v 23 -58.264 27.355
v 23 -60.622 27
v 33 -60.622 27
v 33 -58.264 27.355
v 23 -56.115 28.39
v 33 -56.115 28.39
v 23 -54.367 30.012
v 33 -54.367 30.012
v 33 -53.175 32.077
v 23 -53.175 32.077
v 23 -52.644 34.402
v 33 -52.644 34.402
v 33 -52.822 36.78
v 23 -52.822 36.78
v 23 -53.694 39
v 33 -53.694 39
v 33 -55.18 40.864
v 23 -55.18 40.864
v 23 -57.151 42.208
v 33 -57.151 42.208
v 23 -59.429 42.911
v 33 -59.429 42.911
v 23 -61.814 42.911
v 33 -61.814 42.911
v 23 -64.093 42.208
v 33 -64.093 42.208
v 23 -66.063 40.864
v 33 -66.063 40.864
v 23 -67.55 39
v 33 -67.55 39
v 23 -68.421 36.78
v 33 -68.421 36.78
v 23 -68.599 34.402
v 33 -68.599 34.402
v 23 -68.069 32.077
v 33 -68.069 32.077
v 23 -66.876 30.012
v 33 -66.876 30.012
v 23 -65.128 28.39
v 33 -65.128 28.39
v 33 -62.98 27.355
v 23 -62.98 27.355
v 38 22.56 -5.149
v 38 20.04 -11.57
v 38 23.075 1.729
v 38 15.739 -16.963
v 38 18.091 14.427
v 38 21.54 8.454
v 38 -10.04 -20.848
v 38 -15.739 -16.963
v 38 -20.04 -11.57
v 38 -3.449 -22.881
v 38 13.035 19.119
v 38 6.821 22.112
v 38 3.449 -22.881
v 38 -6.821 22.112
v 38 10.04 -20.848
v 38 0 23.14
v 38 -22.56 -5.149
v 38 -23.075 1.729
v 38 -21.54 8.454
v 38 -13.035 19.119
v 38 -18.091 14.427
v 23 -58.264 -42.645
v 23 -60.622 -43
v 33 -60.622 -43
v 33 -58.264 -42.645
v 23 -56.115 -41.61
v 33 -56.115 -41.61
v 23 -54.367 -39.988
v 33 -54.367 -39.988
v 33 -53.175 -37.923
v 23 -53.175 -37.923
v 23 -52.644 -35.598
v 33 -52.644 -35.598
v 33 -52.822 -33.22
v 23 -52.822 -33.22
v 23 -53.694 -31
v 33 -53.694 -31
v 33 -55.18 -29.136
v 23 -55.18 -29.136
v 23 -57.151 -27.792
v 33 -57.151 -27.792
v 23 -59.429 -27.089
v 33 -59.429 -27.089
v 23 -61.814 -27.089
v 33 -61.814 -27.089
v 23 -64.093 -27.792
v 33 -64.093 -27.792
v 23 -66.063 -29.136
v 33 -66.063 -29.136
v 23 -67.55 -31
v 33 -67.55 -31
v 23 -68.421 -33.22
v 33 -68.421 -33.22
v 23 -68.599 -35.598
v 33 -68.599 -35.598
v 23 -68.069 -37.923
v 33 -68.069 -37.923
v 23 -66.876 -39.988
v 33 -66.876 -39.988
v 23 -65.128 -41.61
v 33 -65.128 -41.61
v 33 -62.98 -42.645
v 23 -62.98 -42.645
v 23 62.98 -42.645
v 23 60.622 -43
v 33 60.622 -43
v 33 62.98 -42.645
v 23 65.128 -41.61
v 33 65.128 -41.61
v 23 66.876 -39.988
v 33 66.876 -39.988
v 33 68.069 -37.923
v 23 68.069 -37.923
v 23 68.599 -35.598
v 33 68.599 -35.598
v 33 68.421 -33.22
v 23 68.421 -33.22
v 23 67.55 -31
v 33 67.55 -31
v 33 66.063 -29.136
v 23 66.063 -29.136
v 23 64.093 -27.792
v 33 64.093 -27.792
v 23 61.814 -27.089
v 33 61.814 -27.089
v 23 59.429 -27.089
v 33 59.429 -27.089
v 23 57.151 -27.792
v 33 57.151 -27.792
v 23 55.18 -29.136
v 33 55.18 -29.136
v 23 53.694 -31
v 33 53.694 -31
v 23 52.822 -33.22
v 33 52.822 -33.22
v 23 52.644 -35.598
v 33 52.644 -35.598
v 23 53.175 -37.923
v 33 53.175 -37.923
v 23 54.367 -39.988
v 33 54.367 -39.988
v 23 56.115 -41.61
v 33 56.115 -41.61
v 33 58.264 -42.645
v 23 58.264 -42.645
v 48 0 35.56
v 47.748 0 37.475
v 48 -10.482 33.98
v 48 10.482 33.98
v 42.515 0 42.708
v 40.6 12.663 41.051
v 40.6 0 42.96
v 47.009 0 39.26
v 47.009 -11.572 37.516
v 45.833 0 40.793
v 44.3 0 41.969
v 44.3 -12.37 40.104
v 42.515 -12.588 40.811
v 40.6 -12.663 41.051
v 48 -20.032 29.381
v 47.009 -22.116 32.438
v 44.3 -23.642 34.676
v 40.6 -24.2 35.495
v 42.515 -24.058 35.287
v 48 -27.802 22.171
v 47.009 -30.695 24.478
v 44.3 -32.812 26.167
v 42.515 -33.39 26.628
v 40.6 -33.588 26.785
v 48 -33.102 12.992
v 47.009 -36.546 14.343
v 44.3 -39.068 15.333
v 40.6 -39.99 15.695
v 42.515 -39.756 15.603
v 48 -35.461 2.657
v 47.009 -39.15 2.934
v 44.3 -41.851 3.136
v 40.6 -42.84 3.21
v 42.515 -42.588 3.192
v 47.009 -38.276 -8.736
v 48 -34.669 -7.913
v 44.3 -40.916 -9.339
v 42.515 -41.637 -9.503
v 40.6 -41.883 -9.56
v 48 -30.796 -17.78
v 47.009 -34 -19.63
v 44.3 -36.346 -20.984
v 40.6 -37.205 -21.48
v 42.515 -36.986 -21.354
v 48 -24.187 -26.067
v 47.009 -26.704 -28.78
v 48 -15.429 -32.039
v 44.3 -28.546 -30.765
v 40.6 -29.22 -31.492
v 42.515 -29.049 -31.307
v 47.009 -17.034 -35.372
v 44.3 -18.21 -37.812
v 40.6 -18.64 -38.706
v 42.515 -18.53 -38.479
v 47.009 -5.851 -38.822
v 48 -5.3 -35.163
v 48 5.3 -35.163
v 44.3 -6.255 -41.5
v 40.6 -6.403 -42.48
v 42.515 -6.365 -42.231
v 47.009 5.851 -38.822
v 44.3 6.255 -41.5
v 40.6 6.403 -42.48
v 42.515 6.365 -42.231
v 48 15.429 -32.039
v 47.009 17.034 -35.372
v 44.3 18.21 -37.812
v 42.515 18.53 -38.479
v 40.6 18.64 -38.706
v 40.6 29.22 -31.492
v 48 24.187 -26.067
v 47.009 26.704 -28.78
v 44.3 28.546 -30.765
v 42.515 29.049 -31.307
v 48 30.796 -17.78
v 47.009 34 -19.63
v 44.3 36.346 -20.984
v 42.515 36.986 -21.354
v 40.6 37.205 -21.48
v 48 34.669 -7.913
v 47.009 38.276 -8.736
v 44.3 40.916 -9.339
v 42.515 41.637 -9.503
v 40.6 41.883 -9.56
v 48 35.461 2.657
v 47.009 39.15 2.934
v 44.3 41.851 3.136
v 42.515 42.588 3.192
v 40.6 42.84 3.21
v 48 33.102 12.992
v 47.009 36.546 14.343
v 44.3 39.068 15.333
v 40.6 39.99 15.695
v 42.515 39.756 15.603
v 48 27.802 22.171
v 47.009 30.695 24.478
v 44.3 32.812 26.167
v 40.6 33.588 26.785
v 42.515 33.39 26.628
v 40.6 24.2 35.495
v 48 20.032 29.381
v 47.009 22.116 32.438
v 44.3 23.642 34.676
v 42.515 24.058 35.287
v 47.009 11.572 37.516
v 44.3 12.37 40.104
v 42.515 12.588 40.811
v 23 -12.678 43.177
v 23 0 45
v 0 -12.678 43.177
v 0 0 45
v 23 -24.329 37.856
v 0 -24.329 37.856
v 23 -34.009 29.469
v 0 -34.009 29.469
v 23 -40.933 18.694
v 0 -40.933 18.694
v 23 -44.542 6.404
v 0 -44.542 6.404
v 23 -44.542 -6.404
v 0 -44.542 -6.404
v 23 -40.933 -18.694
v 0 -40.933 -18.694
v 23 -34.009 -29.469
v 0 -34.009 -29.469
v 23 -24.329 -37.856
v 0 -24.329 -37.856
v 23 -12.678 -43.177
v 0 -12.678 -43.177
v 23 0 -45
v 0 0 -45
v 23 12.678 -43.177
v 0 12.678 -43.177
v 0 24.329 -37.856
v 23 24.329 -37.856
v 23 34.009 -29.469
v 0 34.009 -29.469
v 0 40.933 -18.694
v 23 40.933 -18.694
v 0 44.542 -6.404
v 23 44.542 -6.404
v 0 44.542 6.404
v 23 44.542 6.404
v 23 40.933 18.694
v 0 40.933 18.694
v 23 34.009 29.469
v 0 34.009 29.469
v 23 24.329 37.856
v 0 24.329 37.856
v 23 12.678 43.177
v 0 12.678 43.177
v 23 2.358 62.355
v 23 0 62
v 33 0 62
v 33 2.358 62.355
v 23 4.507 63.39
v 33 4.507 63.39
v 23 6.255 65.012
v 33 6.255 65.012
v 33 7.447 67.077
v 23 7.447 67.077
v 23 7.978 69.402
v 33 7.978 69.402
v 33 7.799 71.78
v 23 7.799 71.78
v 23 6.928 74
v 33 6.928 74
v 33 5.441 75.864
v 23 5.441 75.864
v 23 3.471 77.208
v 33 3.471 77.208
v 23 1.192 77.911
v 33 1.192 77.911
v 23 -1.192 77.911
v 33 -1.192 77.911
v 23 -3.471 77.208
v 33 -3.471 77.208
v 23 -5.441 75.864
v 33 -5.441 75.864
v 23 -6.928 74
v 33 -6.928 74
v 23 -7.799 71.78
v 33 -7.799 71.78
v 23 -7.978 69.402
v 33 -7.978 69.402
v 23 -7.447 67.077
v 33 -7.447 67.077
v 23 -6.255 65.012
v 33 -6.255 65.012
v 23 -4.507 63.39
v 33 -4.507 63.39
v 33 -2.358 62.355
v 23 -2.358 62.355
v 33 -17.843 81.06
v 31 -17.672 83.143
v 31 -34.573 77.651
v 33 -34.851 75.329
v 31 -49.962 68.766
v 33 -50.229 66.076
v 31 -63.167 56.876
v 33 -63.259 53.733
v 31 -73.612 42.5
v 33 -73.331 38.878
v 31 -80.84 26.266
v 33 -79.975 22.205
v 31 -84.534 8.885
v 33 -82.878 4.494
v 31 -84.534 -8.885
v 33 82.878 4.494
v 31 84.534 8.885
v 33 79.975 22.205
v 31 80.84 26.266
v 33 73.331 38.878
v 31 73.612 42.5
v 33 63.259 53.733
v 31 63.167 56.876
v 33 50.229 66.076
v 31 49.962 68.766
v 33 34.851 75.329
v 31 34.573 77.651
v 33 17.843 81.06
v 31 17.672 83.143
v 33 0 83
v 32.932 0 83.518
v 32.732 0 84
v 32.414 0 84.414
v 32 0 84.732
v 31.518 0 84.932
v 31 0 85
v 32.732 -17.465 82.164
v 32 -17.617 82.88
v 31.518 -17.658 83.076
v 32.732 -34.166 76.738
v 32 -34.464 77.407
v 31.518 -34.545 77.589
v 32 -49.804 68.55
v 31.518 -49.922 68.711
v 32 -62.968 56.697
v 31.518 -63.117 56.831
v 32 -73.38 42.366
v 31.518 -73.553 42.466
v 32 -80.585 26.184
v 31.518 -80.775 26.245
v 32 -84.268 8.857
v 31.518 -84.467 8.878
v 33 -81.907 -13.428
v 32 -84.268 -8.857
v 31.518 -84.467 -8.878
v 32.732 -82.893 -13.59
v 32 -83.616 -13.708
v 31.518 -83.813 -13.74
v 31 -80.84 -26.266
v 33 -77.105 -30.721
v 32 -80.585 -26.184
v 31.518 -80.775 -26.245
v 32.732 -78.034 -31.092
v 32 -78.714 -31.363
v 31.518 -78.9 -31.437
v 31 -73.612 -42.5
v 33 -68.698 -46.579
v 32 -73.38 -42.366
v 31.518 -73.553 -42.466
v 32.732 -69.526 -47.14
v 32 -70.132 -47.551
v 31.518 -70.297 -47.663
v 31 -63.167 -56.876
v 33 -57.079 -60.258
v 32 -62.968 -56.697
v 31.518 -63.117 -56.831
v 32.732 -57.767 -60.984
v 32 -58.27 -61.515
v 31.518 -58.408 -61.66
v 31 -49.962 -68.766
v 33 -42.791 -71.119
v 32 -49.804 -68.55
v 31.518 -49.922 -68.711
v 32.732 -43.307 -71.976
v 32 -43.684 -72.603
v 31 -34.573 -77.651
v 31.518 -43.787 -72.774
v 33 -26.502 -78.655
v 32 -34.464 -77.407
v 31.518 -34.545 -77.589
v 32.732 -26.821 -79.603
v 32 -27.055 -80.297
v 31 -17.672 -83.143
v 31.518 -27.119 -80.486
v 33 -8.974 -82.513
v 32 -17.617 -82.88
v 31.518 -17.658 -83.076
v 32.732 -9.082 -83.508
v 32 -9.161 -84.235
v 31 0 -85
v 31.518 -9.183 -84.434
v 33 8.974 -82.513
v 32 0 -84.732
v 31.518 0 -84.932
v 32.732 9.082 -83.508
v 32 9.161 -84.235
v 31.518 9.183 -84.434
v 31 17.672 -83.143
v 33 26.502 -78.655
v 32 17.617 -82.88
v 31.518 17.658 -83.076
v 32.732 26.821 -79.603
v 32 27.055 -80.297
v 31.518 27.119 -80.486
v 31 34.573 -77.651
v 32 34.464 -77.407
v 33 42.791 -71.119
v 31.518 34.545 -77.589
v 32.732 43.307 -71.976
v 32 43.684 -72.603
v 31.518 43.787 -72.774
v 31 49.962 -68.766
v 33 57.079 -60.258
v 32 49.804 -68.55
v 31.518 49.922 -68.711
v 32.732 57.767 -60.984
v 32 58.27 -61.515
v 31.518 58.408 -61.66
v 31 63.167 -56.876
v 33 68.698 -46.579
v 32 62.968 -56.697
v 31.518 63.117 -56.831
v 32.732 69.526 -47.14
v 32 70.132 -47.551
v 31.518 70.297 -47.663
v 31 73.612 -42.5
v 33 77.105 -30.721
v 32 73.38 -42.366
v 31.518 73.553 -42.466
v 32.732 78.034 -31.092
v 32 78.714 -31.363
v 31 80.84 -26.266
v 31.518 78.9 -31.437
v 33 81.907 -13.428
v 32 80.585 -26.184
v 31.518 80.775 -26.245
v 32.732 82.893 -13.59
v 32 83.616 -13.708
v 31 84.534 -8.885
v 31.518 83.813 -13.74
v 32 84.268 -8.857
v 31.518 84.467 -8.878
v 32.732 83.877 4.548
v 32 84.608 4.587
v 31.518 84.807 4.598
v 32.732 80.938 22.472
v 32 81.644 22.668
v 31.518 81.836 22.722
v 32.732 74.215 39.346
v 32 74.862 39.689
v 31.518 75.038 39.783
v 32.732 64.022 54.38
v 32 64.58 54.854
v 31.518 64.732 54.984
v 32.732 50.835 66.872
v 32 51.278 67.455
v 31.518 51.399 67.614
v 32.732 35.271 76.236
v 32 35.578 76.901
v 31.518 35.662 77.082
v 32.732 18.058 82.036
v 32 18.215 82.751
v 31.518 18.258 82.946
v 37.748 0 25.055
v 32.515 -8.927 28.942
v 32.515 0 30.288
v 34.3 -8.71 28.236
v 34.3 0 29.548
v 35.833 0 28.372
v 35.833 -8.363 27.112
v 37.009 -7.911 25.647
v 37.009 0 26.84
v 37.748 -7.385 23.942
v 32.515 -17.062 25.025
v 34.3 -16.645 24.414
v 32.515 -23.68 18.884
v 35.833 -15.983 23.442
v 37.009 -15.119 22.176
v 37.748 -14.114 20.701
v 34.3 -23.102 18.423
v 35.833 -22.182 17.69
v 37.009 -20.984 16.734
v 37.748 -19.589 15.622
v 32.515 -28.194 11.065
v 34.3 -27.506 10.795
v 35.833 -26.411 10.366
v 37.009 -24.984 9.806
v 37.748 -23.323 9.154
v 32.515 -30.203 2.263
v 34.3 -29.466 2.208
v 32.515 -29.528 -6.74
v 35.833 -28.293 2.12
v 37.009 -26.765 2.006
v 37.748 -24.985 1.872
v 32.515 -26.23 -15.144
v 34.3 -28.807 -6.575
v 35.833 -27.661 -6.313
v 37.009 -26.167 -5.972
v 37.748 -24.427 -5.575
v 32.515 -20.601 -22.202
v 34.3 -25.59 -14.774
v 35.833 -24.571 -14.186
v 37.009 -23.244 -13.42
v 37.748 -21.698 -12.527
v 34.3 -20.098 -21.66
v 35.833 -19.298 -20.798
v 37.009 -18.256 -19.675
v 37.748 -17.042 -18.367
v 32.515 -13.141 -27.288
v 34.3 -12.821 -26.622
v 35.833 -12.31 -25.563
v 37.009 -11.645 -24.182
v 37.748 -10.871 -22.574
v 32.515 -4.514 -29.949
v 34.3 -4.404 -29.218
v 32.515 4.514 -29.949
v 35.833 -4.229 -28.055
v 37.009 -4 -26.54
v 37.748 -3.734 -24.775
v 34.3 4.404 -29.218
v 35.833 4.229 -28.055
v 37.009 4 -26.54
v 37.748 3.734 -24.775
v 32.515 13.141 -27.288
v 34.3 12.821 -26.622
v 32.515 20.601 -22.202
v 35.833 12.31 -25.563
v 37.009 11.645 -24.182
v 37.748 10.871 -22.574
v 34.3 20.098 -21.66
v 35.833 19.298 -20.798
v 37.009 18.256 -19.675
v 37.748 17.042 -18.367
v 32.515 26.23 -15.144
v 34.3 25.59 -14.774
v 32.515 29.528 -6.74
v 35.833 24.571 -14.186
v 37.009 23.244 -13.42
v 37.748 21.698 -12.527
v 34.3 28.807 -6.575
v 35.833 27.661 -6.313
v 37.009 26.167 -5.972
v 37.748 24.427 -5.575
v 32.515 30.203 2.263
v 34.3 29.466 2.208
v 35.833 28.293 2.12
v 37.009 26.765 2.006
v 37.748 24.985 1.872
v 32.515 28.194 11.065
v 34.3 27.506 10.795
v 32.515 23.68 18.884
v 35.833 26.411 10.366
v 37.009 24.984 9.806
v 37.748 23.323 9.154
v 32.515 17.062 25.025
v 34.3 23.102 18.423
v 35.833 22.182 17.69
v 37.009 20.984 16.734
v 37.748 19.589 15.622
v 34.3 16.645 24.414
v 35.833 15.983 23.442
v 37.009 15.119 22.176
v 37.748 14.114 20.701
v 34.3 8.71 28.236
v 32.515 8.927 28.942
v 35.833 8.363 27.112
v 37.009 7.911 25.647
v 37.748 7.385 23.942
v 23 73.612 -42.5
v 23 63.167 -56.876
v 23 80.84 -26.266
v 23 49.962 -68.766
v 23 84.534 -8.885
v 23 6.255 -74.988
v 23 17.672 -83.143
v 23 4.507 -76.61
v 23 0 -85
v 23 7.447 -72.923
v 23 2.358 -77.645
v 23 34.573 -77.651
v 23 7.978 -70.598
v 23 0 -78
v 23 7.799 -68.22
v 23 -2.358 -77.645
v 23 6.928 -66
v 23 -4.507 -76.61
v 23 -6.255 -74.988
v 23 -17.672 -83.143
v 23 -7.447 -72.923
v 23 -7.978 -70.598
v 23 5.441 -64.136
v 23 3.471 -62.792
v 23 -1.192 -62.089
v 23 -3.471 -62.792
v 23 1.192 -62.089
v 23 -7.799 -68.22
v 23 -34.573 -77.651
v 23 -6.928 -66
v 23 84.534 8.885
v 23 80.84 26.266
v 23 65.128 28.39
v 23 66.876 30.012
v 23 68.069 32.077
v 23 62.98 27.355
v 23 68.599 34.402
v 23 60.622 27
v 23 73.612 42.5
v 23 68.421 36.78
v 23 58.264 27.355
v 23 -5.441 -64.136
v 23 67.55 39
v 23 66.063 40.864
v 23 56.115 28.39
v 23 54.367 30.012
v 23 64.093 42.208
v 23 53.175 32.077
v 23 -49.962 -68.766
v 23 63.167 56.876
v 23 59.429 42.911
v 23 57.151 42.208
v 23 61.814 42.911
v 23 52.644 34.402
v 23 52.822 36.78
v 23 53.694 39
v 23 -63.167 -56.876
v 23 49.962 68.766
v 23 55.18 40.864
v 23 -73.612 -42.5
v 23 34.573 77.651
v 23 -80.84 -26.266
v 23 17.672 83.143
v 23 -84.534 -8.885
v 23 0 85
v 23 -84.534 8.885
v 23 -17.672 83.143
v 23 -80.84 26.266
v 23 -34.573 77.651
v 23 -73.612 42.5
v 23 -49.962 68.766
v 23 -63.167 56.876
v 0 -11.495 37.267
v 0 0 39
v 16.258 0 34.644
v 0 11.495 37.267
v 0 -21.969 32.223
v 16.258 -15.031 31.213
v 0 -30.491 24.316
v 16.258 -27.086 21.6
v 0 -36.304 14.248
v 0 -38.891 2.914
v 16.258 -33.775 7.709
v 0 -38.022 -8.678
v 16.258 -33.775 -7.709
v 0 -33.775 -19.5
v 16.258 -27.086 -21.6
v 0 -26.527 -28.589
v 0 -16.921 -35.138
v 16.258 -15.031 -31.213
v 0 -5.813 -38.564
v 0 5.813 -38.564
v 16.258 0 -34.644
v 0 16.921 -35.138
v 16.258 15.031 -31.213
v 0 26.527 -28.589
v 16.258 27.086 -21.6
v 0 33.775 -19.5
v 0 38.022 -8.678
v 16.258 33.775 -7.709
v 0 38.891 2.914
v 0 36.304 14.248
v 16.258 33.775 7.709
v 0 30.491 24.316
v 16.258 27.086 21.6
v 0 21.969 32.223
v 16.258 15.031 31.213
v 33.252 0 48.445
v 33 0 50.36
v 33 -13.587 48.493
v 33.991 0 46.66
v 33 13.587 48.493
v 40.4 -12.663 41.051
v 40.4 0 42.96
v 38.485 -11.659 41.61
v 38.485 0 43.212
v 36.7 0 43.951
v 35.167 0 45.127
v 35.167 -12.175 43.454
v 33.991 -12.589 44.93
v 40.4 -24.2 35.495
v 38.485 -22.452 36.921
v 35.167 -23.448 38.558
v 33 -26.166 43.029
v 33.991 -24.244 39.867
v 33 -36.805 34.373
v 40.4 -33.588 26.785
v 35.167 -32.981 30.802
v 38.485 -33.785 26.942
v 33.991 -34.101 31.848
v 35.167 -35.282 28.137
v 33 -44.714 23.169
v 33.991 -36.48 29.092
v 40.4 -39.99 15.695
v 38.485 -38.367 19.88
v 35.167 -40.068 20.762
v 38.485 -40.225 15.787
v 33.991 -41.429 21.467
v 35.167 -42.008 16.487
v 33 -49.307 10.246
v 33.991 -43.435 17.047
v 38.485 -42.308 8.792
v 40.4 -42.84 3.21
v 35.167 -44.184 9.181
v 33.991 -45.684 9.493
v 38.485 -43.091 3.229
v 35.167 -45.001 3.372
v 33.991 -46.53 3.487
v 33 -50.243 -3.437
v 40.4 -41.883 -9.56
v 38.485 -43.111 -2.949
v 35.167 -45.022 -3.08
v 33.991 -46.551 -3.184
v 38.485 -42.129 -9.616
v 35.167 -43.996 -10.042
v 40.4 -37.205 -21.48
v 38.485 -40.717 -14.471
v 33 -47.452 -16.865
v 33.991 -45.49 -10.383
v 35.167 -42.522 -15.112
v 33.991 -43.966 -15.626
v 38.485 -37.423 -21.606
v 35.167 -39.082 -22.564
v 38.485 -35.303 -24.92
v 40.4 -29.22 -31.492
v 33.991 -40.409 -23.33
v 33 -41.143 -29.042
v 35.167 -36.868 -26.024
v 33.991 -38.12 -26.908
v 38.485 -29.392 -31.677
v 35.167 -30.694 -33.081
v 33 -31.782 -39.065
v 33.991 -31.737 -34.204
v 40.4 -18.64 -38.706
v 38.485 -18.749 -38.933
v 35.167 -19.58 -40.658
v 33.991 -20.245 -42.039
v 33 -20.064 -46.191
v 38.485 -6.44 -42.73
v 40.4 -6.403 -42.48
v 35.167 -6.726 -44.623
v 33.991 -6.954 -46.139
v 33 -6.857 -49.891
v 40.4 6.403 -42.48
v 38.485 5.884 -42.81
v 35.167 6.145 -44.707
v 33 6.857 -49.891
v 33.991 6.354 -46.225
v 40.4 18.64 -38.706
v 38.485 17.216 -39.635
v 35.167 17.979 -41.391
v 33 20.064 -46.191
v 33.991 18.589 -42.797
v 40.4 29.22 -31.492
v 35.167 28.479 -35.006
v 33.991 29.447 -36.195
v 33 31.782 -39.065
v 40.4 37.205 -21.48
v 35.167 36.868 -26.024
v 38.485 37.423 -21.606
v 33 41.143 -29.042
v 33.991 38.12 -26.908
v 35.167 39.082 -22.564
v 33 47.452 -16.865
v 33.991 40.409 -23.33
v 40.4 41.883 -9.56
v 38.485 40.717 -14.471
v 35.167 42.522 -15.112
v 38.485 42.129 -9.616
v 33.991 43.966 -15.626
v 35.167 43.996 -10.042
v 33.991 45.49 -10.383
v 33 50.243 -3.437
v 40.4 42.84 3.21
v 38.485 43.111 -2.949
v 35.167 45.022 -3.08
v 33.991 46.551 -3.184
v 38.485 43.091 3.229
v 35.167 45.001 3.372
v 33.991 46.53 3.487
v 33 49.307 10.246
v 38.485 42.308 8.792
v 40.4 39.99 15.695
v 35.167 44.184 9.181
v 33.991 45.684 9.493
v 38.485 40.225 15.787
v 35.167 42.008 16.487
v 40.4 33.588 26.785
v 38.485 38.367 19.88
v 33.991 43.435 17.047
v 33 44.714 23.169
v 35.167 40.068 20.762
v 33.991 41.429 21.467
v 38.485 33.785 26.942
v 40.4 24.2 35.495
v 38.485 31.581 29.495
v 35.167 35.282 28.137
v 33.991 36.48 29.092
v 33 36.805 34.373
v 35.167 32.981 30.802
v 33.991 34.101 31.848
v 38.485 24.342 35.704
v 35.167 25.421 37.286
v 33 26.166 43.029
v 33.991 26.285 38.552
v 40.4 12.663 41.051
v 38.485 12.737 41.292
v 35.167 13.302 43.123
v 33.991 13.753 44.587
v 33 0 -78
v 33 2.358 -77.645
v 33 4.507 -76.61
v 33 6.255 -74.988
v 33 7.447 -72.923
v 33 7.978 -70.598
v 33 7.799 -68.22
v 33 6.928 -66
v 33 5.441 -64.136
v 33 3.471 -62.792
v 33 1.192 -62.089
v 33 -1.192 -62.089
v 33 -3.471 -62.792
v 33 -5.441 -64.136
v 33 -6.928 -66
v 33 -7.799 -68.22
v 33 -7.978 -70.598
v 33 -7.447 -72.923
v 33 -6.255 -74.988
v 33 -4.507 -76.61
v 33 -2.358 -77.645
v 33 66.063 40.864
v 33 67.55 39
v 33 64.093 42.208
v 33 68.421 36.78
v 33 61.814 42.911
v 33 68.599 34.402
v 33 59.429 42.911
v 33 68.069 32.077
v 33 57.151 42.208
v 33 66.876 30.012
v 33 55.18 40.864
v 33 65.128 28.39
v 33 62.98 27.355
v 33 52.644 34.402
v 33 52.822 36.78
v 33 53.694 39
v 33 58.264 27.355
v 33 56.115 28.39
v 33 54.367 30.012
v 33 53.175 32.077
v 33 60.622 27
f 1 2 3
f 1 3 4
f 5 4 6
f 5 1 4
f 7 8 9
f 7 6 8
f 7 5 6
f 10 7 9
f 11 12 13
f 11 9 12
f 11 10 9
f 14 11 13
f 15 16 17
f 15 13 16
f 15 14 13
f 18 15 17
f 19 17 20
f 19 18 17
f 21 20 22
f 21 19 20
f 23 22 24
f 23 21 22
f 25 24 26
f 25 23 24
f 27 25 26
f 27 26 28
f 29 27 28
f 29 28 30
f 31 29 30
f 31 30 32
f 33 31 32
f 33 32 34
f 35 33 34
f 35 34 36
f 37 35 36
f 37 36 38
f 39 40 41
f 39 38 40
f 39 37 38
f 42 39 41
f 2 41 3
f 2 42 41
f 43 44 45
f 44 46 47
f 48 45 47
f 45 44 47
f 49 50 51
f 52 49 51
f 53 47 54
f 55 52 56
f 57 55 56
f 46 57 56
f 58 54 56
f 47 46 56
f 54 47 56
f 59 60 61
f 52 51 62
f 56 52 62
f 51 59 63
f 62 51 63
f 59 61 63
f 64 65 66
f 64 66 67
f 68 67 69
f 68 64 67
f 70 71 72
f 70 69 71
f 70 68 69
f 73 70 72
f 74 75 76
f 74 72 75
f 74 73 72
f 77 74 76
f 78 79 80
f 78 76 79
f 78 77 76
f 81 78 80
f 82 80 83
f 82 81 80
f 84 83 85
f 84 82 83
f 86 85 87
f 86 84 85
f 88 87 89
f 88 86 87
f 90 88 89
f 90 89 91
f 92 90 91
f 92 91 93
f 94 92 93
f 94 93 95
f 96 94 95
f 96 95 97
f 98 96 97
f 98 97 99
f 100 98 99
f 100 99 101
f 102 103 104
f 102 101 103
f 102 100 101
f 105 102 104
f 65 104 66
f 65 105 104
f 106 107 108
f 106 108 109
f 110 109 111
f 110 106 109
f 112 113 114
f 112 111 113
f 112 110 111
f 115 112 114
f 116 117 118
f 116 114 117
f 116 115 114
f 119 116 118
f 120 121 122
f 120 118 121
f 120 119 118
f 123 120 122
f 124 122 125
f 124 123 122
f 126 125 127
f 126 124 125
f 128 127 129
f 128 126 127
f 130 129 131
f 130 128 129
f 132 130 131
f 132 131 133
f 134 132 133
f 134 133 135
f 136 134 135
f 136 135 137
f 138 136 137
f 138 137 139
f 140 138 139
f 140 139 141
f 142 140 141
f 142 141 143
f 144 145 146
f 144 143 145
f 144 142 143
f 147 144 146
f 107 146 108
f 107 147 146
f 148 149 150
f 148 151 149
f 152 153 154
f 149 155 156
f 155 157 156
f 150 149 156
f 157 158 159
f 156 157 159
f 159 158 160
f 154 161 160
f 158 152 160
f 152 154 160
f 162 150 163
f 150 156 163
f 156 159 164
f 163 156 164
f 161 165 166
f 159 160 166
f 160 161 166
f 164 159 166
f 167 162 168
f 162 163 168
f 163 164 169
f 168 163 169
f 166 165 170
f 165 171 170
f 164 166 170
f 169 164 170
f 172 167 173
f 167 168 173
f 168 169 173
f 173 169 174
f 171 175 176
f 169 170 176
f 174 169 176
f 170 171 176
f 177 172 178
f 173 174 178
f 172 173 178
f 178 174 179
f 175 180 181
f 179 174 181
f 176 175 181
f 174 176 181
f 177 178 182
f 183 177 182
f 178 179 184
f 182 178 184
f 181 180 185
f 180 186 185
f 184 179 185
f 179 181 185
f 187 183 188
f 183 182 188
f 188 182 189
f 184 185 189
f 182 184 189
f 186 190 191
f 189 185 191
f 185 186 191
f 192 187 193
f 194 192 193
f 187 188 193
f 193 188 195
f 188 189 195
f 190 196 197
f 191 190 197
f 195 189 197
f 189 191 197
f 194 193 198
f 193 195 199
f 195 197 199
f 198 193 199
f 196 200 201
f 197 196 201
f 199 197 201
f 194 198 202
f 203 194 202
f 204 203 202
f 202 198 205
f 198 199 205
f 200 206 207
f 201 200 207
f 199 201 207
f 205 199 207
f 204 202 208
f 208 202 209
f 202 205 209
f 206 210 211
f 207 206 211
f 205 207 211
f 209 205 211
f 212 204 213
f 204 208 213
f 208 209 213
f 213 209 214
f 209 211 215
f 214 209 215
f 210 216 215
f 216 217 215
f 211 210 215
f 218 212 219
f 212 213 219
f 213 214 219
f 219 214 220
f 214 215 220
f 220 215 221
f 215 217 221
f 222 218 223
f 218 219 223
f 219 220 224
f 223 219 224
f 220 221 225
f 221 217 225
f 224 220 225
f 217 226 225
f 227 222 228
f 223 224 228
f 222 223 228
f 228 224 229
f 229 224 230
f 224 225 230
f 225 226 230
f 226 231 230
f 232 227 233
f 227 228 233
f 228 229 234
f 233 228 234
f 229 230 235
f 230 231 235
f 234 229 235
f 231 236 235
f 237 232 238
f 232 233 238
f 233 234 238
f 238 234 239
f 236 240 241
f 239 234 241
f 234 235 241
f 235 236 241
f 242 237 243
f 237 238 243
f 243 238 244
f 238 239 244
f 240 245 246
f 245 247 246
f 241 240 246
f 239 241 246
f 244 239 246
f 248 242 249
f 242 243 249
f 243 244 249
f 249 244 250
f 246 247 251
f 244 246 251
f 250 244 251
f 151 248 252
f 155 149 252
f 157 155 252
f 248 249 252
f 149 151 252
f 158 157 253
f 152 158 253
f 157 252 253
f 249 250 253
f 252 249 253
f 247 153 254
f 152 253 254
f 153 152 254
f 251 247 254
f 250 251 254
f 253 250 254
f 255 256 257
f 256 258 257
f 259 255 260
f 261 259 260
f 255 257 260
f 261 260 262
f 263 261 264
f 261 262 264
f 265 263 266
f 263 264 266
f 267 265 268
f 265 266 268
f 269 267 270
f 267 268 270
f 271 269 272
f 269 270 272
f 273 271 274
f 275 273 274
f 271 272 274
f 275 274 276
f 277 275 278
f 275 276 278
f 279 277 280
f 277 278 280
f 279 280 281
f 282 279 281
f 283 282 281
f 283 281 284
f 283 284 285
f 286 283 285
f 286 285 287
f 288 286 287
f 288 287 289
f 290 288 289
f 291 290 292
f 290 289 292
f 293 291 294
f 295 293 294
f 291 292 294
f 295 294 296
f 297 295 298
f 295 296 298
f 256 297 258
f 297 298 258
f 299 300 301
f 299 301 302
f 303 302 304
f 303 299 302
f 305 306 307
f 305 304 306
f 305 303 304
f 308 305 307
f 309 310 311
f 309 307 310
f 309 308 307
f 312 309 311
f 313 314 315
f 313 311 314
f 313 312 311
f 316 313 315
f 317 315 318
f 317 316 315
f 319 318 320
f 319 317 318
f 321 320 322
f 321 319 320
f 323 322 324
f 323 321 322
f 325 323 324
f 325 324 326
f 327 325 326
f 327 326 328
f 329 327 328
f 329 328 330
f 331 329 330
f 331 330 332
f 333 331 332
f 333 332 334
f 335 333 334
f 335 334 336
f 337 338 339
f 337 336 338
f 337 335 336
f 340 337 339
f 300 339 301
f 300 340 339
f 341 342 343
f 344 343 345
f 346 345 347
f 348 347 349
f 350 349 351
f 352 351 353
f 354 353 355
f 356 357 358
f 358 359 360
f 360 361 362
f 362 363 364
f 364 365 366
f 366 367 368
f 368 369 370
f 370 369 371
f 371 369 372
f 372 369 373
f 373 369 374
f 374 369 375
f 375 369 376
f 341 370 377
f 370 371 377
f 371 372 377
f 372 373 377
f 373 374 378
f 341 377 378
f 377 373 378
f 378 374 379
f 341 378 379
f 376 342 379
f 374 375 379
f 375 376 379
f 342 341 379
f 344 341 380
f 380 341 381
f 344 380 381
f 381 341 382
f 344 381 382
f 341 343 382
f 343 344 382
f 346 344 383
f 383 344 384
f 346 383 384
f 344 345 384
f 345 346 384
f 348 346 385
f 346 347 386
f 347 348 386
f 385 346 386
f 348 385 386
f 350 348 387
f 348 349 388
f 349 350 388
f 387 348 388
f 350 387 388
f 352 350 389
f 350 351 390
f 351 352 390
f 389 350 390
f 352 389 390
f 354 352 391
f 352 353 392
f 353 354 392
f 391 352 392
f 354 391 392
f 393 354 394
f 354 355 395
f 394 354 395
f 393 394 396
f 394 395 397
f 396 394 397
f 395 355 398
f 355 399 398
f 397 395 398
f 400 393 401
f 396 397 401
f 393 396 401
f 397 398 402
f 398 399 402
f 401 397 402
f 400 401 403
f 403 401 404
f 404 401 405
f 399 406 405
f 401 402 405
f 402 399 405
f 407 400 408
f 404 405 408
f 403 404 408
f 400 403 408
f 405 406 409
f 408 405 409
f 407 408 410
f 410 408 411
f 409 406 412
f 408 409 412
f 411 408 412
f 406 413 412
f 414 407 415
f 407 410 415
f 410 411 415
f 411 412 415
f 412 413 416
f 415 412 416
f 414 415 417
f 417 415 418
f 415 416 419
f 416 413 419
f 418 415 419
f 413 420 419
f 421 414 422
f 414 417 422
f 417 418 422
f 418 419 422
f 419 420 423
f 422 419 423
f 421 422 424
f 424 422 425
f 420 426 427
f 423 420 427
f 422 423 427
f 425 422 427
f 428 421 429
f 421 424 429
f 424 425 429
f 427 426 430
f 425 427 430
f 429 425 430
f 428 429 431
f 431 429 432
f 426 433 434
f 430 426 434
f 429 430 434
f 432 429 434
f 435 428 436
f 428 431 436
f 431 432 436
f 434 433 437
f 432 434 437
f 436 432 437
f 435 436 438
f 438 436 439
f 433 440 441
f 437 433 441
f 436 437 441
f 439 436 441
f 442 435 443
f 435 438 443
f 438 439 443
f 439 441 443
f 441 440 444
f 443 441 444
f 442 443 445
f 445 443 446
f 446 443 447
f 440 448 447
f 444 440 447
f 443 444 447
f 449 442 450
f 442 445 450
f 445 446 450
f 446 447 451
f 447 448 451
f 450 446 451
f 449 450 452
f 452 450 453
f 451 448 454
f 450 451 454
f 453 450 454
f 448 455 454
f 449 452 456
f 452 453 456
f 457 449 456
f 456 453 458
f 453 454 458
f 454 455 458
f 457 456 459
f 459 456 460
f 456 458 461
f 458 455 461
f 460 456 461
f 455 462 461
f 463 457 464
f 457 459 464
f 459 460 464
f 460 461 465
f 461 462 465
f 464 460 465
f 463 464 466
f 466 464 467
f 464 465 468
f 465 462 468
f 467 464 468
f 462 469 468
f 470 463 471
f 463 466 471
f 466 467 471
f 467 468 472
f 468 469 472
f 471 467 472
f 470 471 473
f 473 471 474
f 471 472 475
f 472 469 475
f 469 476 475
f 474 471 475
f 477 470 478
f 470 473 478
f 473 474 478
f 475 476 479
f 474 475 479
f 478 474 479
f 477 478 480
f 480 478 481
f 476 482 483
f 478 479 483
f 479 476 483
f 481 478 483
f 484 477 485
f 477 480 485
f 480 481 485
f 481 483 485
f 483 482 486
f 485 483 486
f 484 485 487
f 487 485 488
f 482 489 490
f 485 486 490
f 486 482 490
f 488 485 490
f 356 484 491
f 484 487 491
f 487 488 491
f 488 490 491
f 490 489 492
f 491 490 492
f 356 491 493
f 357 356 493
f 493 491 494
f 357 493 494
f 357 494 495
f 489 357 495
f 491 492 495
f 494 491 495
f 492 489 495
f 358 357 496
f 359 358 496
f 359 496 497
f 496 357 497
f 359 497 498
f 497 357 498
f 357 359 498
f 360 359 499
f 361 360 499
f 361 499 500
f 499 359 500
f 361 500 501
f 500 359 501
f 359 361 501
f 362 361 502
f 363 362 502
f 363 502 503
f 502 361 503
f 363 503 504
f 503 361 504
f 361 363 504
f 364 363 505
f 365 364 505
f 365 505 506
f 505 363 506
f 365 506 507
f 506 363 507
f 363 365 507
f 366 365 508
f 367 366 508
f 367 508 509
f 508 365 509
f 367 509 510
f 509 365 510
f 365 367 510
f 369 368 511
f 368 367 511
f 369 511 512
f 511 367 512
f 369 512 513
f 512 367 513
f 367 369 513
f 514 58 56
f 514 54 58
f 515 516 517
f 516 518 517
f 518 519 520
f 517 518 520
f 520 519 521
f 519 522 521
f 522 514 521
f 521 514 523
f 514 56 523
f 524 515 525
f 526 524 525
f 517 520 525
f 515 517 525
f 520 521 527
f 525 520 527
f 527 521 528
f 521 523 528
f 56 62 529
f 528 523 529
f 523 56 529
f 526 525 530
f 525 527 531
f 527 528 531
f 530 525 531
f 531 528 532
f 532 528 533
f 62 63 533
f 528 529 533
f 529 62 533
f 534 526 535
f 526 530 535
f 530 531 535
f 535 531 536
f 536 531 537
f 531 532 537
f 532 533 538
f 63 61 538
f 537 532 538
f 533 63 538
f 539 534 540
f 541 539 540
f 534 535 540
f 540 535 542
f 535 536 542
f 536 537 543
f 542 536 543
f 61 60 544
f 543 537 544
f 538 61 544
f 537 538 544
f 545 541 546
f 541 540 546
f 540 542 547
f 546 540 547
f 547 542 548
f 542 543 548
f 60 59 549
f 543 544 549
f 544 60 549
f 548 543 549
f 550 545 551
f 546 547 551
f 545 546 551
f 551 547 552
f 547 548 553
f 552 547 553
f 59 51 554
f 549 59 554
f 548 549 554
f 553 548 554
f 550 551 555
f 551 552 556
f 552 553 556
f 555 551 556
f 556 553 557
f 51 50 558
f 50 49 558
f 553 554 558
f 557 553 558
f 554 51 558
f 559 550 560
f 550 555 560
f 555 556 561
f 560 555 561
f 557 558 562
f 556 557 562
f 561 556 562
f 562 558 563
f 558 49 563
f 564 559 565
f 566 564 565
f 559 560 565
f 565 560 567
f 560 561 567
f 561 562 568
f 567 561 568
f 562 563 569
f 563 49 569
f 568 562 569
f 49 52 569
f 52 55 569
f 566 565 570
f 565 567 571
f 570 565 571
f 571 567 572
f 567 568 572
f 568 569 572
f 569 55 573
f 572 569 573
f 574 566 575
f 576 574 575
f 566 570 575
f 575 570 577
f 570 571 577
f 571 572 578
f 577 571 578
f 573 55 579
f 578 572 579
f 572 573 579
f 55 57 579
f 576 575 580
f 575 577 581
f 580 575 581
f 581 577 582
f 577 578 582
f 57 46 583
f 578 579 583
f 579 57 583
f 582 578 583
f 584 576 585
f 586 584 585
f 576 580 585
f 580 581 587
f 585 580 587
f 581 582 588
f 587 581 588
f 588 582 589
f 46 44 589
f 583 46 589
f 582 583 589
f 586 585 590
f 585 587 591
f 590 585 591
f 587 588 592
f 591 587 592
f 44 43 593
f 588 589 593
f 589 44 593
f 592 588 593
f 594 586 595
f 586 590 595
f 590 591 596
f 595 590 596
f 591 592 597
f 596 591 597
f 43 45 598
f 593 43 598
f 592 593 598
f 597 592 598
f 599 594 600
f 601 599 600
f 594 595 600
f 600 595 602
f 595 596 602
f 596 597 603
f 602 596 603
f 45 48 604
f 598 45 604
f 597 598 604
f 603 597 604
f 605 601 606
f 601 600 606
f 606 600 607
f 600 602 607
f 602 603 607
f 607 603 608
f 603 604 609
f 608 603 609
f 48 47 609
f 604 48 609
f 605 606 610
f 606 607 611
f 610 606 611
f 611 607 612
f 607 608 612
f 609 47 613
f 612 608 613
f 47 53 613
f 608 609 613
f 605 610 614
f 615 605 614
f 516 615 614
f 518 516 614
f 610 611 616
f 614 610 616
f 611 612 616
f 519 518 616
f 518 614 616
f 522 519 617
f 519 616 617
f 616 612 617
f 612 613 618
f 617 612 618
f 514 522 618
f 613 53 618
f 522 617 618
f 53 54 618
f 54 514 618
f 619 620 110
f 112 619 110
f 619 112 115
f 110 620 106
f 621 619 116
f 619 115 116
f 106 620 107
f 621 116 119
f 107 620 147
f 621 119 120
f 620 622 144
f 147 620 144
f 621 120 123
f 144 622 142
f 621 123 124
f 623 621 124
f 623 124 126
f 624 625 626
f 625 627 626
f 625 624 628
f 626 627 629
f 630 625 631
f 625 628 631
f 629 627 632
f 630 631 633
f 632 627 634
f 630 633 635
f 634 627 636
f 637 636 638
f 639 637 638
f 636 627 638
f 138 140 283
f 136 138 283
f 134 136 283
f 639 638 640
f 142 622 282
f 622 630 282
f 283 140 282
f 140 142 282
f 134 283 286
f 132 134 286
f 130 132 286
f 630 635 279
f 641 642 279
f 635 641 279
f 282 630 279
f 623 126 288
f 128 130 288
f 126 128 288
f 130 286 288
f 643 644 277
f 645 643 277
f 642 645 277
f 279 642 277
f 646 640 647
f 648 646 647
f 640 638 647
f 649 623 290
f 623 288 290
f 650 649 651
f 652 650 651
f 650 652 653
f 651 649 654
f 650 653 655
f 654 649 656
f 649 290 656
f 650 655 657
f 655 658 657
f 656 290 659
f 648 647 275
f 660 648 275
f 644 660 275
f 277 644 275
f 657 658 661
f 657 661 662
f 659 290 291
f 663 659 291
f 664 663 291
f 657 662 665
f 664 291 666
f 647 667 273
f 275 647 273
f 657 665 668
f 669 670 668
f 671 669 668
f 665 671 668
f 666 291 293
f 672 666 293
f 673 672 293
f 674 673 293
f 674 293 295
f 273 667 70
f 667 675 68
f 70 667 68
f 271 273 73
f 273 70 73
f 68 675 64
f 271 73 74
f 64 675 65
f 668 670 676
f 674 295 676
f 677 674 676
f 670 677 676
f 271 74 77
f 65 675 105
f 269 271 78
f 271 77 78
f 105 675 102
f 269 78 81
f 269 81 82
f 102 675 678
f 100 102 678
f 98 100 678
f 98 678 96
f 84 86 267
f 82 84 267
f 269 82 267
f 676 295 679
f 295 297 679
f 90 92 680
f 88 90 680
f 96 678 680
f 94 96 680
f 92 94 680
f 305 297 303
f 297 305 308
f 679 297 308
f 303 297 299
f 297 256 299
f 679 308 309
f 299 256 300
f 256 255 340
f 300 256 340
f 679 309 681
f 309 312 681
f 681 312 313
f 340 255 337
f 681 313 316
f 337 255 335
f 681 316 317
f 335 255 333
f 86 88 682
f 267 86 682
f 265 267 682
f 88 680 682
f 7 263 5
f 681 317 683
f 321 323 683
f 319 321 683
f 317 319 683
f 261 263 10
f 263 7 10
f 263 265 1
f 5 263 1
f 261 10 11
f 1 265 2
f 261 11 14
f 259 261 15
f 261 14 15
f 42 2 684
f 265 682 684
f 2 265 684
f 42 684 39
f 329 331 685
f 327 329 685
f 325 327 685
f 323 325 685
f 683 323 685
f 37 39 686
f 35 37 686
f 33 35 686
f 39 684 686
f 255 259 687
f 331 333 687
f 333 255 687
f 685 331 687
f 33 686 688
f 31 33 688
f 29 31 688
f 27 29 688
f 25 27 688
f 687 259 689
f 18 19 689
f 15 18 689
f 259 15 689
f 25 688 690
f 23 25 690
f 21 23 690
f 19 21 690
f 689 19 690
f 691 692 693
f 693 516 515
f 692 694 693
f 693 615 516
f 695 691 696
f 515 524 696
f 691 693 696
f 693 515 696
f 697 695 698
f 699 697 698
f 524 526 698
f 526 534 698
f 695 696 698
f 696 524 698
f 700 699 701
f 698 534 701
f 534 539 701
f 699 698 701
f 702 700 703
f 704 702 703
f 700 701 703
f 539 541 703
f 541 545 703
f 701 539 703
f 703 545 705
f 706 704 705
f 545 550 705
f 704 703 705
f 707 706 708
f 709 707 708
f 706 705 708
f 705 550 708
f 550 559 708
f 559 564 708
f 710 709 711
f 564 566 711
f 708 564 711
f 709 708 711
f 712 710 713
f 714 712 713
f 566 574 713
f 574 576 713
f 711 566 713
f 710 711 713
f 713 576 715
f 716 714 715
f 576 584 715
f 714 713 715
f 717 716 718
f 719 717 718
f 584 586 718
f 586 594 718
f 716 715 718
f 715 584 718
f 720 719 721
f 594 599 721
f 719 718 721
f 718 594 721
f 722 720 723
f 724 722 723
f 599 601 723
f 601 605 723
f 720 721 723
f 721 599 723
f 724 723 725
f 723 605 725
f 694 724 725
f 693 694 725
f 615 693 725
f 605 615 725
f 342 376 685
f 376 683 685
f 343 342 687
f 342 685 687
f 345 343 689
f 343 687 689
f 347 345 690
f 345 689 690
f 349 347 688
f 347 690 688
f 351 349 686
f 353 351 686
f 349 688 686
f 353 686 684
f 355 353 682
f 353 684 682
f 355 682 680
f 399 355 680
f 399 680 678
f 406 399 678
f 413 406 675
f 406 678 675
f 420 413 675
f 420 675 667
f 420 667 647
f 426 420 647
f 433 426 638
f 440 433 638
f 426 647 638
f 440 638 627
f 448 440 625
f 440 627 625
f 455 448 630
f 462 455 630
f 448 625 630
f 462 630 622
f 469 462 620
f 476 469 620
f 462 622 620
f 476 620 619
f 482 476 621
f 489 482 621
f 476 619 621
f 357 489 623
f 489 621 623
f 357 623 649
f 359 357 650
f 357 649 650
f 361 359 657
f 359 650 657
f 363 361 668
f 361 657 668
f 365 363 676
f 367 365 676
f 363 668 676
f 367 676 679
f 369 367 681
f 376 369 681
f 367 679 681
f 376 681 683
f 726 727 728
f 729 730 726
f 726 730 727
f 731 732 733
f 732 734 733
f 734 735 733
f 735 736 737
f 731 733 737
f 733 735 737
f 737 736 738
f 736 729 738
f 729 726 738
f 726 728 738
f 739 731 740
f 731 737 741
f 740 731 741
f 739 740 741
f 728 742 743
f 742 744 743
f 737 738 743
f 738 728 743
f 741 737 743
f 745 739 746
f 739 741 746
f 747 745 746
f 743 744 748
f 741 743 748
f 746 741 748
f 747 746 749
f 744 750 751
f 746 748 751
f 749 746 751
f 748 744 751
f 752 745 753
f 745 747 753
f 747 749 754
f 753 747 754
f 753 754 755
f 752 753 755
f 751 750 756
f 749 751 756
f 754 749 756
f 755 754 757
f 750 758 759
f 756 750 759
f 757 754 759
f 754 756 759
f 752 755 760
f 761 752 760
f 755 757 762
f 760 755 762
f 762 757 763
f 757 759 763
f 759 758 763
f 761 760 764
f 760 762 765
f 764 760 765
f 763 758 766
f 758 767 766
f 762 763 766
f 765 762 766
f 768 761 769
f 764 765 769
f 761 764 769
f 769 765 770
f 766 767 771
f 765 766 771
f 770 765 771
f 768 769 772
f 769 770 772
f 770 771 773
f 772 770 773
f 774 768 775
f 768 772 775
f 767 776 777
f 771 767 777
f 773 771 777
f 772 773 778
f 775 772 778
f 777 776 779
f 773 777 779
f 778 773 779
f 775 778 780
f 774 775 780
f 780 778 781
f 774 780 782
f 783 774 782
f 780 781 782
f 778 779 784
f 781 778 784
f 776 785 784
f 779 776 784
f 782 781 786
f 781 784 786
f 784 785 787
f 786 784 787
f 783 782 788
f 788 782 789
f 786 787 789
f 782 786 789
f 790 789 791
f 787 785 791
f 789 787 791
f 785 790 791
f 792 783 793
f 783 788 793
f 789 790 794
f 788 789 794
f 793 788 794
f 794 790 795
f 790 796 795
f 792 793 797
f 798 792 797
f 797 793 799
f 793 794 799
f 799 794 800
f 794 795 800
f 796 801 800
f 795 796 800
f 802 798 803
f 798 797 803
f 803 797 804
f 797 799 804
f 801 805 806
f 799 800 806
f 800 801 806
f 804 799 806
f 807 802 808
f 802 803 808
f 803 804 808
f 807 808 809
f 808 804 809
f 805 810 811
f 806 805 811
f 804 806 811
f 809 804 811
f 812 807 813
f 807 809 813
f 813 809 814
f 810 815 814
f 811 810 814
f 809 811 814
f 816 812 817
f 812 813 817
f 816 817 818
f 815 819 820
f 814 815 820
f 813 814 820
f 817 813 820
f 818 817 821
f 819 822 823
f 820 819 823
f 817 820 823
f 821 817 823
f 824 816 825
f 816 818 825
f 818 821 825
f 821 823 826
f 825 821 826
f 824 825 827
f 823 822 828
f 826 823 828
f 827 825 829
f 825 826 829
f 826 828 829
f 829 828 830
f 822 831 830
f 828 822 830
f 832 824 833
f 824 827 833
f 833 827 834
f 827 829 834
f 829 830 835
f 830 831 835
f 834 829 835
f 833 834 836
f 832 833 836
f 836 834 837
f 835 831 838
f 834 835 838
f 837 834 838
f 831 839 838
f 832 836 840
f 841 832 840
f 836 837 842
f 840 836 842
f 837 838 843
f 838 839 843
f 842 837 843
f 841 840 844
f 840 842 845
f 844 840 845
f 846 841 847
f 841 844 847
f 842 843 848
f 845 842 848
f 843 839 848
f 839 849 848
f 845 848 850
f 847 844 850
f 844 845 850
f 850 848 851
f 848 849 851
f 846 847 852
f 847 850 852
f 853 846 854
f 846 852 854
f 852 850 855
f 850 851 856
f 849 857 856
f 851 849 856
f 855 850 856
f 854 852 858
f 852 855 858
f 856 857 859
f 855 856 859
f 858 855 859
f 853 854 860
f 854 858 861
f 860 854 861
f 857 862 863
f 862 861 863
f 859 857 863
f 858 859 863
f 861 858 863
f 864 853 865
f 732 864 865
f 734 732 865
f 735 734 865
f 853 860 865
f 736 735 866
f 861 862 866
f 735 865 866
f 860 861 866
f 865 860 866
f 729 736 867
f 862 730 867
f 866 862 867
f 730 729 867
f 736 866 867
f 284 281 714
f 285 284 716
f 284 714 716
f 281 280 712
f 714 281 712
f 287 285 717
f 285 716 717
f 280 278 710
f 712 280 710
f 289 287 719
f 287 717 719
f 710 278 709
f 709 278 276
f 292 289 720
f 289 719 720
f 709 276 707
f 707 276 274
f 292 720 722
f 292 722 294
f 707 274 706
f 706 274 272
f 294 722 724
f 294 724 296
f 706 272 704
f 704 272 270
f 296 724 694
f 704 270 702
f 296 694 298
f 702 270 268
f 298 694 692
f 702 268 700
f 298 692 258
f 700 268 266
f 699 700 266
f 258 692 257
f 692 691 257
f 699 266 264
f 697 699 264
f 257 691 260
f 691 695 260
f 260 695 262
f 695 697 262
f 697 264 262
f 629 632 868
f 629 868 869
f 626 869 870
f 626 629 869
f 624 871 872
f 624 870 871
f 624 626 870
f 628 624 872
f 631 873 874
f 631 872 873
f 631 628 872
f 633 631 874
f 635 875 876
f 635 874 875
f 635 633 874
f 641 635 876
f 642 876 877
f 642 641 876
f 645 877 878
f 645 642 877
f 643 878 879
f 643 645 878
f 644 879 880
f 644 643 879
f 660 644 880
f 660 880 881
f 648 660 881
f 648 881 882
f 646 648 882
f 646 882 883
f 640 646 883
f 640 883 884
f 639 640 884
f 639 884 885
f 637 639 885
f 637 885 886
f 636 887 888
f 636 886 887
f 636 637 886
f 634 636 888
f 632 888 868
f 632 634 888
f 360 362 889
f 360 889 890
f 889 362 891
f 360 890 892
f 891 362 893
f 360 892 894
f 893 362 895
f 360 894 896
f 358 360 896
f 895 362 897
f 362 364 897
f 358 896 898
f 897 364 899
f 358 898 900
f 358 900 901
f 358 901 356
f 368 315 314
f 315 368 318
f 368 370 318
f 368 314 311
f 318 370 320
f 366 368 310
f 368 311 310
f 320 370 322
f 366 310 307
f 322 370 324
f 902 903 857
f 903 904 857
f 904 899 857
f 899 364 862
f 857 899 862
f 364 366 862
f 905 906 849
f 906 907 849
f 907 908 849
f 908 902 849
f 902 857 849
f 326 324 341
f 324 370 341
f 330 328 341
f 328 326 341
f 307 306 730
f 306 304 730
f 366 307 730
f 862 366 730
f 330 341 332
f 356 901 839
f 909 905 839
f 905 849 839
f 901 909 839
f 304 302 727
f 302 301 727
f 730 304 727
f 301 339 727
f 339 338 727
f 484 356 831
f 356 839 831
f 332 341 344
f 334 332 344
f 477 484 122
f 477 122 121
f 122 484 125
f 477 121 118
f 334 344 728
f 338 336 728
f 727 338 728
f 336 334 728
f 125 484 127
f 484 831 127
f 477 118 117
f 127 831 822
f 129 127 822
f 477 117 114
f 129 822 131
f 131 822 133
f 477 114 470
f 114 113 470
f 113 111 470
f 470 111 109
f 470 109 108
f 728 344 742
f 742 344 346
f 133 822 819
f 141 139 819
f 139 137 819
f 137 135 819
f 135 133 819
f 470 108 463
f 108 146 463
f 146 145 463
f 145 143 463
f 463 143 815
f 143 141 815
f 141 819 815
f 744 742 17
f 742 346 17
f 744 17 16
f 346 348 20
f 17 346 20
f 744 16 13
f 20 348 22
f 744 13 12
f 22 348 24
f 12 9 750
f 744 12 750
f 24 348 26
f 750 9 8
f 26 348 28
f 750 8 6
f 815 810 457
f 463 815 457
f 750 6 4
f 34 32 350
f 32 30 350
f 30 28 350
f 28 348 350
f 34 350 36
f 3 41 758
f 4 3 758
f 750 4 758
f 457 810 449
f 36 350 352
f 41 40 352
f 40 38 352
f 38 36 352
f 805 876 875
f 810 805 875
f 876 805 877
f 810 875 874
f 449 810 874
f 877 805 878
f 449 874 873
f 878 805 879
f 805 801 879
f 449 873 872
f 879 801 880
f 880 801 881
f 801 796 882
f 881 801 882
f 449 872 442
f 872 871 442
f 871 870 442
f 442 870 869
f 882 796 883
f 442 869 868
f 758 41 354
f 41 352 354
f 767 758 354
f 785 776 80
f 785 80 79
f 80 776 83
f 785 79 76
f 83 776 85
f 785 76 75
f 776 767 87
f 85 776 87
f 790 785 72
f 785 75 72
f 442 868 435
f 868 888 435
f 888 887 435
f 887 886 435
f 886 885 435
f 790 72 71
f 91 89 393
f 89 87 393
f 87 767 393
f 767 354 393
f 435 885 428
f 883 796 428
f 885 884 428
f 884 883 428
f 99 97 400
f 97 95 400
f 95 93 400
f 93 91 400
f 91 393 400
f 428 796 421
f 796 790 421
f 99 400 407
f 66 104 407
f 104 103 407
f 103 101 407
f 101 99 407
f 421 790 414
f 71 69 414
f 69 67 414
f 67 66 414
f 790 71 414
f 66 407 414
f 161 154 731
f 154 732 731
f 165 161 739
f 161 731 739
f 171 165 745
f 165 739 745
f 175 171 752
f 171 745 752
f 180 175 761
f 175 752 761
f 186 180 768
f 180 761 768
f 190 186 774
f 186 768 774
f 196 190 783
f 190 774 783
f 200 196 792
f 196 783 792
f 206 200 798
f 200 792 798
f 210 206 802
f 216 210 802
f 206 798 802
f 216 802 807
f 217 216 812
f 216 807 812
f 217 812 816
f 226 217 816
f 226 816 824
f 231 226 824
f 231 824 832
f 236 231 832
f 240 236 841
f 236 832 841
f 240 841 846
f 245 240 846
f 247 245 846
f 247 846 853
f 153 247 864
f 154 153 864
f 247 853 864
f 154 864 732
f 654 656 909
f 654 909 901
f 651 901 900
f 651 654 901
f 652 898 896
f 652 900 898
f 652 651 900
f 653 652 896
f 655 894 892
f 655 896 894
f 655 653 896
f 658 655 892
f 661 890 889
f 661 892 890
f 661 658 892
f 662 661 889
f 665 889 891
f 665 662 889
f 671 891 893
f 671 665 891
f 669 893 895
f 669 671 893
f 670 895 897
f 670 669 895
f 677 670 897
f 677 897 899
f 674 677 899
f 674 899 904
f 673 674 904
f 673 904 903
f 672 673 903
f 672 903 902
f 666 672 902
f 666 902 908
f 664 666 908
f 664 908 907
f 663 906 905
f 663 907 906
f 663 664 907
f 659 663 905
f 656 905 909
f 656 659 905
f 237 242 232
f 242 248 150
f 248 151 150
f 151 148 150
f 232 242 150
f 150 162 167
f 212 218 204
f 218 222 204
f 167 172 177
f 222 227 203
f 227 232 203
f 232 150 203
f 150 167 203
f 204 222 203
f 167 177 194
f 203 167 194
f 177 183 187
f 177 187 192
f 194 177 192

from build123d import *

# Parameters (mm, degrees)
CUT_EXTRUDE1_DEPTH      = 125.655525349
CUT_EXTRUDE1_DEPTH_BACK = 125.655525349
SKETCH2_R               = 8


with BuildPart() as part:
    # Sketch1 → Revolve1 (revolve)
    with BuildSketch(Plane.XY, mode=Mode.PRIVATE) as revolve1_sk:
        with BuildLine():
            Line((38, 23.139710977), (38, 0))
            Line((38, 0), (48, 0))
            Line((48, 0), (48, 35.560066311))
            ThreePointArc((48, 35.560066311), (45.832590181, 40.792656492), (40.6, 42.960066311))
            Line((40.6, 42.960066311), (40.4, 42.960066311))
            ThreePointArc((40.4, 42.960066311), (35.167409819, 45.127476131), (33, 50.360066311))
            Line((33, 50.360066311), (33, 83))
            ThreePointArc((33, 83), (32.414213562, 84.414213562), (31, 85))
            Line((31, 85), (23, 85))
            Line((23, 85), (23, 45))
            Line((23, 45), (0, 45))
            Line((0, 45), (0, 39))
            Line((0, 39), (32.515260934, 30.287562091))
            ThreePointArc((32.515260934, 30.287562091), (36.470814718, 27.644545551), (38, 23.139710977))
        make_face()
    revolve(revolve1_sk.sketch.rotate(Axis((0, 0, 0), (1, 0, 0)), 90), axis=Axis((0, 0, 0), (1, 0, 0)))

    # Sketch2 → Cut-Extrude1 (cut, two sides: drawn at the far end of the back side and taken through both)
    with BuildSketch(Plane(origin=(33, 0, 0), x_dir=(0, 0, -1), z_dir=(1, 0, 0)).offset(-CUT_EXTRUDE1_DEPTH_BACK)):
        with Locations((70, 0)):
            Circle(SKETCH2_R)
        with Locations((35, -60.621778265)):
            Circle(SKETCH2_R)
        with Locations((-35, -60.621778265)):
            Circle(SKETCH2_R)
        with Locations((-70, 0)):
            Circle(SKETCH2_R)
        with Locations((-35, 60.621778265)):
            Circle(SKETCH2_R)
        with Locations((35, 60.621778265)):
            Circle(SKETCH2_R)
    extrude(amount=CUT_EXTRUDE1_DEPTH + CUT_EXTRUDE1_DEPTH_BACK, mode=Mode.SUBTRACT)


solid = part.part
